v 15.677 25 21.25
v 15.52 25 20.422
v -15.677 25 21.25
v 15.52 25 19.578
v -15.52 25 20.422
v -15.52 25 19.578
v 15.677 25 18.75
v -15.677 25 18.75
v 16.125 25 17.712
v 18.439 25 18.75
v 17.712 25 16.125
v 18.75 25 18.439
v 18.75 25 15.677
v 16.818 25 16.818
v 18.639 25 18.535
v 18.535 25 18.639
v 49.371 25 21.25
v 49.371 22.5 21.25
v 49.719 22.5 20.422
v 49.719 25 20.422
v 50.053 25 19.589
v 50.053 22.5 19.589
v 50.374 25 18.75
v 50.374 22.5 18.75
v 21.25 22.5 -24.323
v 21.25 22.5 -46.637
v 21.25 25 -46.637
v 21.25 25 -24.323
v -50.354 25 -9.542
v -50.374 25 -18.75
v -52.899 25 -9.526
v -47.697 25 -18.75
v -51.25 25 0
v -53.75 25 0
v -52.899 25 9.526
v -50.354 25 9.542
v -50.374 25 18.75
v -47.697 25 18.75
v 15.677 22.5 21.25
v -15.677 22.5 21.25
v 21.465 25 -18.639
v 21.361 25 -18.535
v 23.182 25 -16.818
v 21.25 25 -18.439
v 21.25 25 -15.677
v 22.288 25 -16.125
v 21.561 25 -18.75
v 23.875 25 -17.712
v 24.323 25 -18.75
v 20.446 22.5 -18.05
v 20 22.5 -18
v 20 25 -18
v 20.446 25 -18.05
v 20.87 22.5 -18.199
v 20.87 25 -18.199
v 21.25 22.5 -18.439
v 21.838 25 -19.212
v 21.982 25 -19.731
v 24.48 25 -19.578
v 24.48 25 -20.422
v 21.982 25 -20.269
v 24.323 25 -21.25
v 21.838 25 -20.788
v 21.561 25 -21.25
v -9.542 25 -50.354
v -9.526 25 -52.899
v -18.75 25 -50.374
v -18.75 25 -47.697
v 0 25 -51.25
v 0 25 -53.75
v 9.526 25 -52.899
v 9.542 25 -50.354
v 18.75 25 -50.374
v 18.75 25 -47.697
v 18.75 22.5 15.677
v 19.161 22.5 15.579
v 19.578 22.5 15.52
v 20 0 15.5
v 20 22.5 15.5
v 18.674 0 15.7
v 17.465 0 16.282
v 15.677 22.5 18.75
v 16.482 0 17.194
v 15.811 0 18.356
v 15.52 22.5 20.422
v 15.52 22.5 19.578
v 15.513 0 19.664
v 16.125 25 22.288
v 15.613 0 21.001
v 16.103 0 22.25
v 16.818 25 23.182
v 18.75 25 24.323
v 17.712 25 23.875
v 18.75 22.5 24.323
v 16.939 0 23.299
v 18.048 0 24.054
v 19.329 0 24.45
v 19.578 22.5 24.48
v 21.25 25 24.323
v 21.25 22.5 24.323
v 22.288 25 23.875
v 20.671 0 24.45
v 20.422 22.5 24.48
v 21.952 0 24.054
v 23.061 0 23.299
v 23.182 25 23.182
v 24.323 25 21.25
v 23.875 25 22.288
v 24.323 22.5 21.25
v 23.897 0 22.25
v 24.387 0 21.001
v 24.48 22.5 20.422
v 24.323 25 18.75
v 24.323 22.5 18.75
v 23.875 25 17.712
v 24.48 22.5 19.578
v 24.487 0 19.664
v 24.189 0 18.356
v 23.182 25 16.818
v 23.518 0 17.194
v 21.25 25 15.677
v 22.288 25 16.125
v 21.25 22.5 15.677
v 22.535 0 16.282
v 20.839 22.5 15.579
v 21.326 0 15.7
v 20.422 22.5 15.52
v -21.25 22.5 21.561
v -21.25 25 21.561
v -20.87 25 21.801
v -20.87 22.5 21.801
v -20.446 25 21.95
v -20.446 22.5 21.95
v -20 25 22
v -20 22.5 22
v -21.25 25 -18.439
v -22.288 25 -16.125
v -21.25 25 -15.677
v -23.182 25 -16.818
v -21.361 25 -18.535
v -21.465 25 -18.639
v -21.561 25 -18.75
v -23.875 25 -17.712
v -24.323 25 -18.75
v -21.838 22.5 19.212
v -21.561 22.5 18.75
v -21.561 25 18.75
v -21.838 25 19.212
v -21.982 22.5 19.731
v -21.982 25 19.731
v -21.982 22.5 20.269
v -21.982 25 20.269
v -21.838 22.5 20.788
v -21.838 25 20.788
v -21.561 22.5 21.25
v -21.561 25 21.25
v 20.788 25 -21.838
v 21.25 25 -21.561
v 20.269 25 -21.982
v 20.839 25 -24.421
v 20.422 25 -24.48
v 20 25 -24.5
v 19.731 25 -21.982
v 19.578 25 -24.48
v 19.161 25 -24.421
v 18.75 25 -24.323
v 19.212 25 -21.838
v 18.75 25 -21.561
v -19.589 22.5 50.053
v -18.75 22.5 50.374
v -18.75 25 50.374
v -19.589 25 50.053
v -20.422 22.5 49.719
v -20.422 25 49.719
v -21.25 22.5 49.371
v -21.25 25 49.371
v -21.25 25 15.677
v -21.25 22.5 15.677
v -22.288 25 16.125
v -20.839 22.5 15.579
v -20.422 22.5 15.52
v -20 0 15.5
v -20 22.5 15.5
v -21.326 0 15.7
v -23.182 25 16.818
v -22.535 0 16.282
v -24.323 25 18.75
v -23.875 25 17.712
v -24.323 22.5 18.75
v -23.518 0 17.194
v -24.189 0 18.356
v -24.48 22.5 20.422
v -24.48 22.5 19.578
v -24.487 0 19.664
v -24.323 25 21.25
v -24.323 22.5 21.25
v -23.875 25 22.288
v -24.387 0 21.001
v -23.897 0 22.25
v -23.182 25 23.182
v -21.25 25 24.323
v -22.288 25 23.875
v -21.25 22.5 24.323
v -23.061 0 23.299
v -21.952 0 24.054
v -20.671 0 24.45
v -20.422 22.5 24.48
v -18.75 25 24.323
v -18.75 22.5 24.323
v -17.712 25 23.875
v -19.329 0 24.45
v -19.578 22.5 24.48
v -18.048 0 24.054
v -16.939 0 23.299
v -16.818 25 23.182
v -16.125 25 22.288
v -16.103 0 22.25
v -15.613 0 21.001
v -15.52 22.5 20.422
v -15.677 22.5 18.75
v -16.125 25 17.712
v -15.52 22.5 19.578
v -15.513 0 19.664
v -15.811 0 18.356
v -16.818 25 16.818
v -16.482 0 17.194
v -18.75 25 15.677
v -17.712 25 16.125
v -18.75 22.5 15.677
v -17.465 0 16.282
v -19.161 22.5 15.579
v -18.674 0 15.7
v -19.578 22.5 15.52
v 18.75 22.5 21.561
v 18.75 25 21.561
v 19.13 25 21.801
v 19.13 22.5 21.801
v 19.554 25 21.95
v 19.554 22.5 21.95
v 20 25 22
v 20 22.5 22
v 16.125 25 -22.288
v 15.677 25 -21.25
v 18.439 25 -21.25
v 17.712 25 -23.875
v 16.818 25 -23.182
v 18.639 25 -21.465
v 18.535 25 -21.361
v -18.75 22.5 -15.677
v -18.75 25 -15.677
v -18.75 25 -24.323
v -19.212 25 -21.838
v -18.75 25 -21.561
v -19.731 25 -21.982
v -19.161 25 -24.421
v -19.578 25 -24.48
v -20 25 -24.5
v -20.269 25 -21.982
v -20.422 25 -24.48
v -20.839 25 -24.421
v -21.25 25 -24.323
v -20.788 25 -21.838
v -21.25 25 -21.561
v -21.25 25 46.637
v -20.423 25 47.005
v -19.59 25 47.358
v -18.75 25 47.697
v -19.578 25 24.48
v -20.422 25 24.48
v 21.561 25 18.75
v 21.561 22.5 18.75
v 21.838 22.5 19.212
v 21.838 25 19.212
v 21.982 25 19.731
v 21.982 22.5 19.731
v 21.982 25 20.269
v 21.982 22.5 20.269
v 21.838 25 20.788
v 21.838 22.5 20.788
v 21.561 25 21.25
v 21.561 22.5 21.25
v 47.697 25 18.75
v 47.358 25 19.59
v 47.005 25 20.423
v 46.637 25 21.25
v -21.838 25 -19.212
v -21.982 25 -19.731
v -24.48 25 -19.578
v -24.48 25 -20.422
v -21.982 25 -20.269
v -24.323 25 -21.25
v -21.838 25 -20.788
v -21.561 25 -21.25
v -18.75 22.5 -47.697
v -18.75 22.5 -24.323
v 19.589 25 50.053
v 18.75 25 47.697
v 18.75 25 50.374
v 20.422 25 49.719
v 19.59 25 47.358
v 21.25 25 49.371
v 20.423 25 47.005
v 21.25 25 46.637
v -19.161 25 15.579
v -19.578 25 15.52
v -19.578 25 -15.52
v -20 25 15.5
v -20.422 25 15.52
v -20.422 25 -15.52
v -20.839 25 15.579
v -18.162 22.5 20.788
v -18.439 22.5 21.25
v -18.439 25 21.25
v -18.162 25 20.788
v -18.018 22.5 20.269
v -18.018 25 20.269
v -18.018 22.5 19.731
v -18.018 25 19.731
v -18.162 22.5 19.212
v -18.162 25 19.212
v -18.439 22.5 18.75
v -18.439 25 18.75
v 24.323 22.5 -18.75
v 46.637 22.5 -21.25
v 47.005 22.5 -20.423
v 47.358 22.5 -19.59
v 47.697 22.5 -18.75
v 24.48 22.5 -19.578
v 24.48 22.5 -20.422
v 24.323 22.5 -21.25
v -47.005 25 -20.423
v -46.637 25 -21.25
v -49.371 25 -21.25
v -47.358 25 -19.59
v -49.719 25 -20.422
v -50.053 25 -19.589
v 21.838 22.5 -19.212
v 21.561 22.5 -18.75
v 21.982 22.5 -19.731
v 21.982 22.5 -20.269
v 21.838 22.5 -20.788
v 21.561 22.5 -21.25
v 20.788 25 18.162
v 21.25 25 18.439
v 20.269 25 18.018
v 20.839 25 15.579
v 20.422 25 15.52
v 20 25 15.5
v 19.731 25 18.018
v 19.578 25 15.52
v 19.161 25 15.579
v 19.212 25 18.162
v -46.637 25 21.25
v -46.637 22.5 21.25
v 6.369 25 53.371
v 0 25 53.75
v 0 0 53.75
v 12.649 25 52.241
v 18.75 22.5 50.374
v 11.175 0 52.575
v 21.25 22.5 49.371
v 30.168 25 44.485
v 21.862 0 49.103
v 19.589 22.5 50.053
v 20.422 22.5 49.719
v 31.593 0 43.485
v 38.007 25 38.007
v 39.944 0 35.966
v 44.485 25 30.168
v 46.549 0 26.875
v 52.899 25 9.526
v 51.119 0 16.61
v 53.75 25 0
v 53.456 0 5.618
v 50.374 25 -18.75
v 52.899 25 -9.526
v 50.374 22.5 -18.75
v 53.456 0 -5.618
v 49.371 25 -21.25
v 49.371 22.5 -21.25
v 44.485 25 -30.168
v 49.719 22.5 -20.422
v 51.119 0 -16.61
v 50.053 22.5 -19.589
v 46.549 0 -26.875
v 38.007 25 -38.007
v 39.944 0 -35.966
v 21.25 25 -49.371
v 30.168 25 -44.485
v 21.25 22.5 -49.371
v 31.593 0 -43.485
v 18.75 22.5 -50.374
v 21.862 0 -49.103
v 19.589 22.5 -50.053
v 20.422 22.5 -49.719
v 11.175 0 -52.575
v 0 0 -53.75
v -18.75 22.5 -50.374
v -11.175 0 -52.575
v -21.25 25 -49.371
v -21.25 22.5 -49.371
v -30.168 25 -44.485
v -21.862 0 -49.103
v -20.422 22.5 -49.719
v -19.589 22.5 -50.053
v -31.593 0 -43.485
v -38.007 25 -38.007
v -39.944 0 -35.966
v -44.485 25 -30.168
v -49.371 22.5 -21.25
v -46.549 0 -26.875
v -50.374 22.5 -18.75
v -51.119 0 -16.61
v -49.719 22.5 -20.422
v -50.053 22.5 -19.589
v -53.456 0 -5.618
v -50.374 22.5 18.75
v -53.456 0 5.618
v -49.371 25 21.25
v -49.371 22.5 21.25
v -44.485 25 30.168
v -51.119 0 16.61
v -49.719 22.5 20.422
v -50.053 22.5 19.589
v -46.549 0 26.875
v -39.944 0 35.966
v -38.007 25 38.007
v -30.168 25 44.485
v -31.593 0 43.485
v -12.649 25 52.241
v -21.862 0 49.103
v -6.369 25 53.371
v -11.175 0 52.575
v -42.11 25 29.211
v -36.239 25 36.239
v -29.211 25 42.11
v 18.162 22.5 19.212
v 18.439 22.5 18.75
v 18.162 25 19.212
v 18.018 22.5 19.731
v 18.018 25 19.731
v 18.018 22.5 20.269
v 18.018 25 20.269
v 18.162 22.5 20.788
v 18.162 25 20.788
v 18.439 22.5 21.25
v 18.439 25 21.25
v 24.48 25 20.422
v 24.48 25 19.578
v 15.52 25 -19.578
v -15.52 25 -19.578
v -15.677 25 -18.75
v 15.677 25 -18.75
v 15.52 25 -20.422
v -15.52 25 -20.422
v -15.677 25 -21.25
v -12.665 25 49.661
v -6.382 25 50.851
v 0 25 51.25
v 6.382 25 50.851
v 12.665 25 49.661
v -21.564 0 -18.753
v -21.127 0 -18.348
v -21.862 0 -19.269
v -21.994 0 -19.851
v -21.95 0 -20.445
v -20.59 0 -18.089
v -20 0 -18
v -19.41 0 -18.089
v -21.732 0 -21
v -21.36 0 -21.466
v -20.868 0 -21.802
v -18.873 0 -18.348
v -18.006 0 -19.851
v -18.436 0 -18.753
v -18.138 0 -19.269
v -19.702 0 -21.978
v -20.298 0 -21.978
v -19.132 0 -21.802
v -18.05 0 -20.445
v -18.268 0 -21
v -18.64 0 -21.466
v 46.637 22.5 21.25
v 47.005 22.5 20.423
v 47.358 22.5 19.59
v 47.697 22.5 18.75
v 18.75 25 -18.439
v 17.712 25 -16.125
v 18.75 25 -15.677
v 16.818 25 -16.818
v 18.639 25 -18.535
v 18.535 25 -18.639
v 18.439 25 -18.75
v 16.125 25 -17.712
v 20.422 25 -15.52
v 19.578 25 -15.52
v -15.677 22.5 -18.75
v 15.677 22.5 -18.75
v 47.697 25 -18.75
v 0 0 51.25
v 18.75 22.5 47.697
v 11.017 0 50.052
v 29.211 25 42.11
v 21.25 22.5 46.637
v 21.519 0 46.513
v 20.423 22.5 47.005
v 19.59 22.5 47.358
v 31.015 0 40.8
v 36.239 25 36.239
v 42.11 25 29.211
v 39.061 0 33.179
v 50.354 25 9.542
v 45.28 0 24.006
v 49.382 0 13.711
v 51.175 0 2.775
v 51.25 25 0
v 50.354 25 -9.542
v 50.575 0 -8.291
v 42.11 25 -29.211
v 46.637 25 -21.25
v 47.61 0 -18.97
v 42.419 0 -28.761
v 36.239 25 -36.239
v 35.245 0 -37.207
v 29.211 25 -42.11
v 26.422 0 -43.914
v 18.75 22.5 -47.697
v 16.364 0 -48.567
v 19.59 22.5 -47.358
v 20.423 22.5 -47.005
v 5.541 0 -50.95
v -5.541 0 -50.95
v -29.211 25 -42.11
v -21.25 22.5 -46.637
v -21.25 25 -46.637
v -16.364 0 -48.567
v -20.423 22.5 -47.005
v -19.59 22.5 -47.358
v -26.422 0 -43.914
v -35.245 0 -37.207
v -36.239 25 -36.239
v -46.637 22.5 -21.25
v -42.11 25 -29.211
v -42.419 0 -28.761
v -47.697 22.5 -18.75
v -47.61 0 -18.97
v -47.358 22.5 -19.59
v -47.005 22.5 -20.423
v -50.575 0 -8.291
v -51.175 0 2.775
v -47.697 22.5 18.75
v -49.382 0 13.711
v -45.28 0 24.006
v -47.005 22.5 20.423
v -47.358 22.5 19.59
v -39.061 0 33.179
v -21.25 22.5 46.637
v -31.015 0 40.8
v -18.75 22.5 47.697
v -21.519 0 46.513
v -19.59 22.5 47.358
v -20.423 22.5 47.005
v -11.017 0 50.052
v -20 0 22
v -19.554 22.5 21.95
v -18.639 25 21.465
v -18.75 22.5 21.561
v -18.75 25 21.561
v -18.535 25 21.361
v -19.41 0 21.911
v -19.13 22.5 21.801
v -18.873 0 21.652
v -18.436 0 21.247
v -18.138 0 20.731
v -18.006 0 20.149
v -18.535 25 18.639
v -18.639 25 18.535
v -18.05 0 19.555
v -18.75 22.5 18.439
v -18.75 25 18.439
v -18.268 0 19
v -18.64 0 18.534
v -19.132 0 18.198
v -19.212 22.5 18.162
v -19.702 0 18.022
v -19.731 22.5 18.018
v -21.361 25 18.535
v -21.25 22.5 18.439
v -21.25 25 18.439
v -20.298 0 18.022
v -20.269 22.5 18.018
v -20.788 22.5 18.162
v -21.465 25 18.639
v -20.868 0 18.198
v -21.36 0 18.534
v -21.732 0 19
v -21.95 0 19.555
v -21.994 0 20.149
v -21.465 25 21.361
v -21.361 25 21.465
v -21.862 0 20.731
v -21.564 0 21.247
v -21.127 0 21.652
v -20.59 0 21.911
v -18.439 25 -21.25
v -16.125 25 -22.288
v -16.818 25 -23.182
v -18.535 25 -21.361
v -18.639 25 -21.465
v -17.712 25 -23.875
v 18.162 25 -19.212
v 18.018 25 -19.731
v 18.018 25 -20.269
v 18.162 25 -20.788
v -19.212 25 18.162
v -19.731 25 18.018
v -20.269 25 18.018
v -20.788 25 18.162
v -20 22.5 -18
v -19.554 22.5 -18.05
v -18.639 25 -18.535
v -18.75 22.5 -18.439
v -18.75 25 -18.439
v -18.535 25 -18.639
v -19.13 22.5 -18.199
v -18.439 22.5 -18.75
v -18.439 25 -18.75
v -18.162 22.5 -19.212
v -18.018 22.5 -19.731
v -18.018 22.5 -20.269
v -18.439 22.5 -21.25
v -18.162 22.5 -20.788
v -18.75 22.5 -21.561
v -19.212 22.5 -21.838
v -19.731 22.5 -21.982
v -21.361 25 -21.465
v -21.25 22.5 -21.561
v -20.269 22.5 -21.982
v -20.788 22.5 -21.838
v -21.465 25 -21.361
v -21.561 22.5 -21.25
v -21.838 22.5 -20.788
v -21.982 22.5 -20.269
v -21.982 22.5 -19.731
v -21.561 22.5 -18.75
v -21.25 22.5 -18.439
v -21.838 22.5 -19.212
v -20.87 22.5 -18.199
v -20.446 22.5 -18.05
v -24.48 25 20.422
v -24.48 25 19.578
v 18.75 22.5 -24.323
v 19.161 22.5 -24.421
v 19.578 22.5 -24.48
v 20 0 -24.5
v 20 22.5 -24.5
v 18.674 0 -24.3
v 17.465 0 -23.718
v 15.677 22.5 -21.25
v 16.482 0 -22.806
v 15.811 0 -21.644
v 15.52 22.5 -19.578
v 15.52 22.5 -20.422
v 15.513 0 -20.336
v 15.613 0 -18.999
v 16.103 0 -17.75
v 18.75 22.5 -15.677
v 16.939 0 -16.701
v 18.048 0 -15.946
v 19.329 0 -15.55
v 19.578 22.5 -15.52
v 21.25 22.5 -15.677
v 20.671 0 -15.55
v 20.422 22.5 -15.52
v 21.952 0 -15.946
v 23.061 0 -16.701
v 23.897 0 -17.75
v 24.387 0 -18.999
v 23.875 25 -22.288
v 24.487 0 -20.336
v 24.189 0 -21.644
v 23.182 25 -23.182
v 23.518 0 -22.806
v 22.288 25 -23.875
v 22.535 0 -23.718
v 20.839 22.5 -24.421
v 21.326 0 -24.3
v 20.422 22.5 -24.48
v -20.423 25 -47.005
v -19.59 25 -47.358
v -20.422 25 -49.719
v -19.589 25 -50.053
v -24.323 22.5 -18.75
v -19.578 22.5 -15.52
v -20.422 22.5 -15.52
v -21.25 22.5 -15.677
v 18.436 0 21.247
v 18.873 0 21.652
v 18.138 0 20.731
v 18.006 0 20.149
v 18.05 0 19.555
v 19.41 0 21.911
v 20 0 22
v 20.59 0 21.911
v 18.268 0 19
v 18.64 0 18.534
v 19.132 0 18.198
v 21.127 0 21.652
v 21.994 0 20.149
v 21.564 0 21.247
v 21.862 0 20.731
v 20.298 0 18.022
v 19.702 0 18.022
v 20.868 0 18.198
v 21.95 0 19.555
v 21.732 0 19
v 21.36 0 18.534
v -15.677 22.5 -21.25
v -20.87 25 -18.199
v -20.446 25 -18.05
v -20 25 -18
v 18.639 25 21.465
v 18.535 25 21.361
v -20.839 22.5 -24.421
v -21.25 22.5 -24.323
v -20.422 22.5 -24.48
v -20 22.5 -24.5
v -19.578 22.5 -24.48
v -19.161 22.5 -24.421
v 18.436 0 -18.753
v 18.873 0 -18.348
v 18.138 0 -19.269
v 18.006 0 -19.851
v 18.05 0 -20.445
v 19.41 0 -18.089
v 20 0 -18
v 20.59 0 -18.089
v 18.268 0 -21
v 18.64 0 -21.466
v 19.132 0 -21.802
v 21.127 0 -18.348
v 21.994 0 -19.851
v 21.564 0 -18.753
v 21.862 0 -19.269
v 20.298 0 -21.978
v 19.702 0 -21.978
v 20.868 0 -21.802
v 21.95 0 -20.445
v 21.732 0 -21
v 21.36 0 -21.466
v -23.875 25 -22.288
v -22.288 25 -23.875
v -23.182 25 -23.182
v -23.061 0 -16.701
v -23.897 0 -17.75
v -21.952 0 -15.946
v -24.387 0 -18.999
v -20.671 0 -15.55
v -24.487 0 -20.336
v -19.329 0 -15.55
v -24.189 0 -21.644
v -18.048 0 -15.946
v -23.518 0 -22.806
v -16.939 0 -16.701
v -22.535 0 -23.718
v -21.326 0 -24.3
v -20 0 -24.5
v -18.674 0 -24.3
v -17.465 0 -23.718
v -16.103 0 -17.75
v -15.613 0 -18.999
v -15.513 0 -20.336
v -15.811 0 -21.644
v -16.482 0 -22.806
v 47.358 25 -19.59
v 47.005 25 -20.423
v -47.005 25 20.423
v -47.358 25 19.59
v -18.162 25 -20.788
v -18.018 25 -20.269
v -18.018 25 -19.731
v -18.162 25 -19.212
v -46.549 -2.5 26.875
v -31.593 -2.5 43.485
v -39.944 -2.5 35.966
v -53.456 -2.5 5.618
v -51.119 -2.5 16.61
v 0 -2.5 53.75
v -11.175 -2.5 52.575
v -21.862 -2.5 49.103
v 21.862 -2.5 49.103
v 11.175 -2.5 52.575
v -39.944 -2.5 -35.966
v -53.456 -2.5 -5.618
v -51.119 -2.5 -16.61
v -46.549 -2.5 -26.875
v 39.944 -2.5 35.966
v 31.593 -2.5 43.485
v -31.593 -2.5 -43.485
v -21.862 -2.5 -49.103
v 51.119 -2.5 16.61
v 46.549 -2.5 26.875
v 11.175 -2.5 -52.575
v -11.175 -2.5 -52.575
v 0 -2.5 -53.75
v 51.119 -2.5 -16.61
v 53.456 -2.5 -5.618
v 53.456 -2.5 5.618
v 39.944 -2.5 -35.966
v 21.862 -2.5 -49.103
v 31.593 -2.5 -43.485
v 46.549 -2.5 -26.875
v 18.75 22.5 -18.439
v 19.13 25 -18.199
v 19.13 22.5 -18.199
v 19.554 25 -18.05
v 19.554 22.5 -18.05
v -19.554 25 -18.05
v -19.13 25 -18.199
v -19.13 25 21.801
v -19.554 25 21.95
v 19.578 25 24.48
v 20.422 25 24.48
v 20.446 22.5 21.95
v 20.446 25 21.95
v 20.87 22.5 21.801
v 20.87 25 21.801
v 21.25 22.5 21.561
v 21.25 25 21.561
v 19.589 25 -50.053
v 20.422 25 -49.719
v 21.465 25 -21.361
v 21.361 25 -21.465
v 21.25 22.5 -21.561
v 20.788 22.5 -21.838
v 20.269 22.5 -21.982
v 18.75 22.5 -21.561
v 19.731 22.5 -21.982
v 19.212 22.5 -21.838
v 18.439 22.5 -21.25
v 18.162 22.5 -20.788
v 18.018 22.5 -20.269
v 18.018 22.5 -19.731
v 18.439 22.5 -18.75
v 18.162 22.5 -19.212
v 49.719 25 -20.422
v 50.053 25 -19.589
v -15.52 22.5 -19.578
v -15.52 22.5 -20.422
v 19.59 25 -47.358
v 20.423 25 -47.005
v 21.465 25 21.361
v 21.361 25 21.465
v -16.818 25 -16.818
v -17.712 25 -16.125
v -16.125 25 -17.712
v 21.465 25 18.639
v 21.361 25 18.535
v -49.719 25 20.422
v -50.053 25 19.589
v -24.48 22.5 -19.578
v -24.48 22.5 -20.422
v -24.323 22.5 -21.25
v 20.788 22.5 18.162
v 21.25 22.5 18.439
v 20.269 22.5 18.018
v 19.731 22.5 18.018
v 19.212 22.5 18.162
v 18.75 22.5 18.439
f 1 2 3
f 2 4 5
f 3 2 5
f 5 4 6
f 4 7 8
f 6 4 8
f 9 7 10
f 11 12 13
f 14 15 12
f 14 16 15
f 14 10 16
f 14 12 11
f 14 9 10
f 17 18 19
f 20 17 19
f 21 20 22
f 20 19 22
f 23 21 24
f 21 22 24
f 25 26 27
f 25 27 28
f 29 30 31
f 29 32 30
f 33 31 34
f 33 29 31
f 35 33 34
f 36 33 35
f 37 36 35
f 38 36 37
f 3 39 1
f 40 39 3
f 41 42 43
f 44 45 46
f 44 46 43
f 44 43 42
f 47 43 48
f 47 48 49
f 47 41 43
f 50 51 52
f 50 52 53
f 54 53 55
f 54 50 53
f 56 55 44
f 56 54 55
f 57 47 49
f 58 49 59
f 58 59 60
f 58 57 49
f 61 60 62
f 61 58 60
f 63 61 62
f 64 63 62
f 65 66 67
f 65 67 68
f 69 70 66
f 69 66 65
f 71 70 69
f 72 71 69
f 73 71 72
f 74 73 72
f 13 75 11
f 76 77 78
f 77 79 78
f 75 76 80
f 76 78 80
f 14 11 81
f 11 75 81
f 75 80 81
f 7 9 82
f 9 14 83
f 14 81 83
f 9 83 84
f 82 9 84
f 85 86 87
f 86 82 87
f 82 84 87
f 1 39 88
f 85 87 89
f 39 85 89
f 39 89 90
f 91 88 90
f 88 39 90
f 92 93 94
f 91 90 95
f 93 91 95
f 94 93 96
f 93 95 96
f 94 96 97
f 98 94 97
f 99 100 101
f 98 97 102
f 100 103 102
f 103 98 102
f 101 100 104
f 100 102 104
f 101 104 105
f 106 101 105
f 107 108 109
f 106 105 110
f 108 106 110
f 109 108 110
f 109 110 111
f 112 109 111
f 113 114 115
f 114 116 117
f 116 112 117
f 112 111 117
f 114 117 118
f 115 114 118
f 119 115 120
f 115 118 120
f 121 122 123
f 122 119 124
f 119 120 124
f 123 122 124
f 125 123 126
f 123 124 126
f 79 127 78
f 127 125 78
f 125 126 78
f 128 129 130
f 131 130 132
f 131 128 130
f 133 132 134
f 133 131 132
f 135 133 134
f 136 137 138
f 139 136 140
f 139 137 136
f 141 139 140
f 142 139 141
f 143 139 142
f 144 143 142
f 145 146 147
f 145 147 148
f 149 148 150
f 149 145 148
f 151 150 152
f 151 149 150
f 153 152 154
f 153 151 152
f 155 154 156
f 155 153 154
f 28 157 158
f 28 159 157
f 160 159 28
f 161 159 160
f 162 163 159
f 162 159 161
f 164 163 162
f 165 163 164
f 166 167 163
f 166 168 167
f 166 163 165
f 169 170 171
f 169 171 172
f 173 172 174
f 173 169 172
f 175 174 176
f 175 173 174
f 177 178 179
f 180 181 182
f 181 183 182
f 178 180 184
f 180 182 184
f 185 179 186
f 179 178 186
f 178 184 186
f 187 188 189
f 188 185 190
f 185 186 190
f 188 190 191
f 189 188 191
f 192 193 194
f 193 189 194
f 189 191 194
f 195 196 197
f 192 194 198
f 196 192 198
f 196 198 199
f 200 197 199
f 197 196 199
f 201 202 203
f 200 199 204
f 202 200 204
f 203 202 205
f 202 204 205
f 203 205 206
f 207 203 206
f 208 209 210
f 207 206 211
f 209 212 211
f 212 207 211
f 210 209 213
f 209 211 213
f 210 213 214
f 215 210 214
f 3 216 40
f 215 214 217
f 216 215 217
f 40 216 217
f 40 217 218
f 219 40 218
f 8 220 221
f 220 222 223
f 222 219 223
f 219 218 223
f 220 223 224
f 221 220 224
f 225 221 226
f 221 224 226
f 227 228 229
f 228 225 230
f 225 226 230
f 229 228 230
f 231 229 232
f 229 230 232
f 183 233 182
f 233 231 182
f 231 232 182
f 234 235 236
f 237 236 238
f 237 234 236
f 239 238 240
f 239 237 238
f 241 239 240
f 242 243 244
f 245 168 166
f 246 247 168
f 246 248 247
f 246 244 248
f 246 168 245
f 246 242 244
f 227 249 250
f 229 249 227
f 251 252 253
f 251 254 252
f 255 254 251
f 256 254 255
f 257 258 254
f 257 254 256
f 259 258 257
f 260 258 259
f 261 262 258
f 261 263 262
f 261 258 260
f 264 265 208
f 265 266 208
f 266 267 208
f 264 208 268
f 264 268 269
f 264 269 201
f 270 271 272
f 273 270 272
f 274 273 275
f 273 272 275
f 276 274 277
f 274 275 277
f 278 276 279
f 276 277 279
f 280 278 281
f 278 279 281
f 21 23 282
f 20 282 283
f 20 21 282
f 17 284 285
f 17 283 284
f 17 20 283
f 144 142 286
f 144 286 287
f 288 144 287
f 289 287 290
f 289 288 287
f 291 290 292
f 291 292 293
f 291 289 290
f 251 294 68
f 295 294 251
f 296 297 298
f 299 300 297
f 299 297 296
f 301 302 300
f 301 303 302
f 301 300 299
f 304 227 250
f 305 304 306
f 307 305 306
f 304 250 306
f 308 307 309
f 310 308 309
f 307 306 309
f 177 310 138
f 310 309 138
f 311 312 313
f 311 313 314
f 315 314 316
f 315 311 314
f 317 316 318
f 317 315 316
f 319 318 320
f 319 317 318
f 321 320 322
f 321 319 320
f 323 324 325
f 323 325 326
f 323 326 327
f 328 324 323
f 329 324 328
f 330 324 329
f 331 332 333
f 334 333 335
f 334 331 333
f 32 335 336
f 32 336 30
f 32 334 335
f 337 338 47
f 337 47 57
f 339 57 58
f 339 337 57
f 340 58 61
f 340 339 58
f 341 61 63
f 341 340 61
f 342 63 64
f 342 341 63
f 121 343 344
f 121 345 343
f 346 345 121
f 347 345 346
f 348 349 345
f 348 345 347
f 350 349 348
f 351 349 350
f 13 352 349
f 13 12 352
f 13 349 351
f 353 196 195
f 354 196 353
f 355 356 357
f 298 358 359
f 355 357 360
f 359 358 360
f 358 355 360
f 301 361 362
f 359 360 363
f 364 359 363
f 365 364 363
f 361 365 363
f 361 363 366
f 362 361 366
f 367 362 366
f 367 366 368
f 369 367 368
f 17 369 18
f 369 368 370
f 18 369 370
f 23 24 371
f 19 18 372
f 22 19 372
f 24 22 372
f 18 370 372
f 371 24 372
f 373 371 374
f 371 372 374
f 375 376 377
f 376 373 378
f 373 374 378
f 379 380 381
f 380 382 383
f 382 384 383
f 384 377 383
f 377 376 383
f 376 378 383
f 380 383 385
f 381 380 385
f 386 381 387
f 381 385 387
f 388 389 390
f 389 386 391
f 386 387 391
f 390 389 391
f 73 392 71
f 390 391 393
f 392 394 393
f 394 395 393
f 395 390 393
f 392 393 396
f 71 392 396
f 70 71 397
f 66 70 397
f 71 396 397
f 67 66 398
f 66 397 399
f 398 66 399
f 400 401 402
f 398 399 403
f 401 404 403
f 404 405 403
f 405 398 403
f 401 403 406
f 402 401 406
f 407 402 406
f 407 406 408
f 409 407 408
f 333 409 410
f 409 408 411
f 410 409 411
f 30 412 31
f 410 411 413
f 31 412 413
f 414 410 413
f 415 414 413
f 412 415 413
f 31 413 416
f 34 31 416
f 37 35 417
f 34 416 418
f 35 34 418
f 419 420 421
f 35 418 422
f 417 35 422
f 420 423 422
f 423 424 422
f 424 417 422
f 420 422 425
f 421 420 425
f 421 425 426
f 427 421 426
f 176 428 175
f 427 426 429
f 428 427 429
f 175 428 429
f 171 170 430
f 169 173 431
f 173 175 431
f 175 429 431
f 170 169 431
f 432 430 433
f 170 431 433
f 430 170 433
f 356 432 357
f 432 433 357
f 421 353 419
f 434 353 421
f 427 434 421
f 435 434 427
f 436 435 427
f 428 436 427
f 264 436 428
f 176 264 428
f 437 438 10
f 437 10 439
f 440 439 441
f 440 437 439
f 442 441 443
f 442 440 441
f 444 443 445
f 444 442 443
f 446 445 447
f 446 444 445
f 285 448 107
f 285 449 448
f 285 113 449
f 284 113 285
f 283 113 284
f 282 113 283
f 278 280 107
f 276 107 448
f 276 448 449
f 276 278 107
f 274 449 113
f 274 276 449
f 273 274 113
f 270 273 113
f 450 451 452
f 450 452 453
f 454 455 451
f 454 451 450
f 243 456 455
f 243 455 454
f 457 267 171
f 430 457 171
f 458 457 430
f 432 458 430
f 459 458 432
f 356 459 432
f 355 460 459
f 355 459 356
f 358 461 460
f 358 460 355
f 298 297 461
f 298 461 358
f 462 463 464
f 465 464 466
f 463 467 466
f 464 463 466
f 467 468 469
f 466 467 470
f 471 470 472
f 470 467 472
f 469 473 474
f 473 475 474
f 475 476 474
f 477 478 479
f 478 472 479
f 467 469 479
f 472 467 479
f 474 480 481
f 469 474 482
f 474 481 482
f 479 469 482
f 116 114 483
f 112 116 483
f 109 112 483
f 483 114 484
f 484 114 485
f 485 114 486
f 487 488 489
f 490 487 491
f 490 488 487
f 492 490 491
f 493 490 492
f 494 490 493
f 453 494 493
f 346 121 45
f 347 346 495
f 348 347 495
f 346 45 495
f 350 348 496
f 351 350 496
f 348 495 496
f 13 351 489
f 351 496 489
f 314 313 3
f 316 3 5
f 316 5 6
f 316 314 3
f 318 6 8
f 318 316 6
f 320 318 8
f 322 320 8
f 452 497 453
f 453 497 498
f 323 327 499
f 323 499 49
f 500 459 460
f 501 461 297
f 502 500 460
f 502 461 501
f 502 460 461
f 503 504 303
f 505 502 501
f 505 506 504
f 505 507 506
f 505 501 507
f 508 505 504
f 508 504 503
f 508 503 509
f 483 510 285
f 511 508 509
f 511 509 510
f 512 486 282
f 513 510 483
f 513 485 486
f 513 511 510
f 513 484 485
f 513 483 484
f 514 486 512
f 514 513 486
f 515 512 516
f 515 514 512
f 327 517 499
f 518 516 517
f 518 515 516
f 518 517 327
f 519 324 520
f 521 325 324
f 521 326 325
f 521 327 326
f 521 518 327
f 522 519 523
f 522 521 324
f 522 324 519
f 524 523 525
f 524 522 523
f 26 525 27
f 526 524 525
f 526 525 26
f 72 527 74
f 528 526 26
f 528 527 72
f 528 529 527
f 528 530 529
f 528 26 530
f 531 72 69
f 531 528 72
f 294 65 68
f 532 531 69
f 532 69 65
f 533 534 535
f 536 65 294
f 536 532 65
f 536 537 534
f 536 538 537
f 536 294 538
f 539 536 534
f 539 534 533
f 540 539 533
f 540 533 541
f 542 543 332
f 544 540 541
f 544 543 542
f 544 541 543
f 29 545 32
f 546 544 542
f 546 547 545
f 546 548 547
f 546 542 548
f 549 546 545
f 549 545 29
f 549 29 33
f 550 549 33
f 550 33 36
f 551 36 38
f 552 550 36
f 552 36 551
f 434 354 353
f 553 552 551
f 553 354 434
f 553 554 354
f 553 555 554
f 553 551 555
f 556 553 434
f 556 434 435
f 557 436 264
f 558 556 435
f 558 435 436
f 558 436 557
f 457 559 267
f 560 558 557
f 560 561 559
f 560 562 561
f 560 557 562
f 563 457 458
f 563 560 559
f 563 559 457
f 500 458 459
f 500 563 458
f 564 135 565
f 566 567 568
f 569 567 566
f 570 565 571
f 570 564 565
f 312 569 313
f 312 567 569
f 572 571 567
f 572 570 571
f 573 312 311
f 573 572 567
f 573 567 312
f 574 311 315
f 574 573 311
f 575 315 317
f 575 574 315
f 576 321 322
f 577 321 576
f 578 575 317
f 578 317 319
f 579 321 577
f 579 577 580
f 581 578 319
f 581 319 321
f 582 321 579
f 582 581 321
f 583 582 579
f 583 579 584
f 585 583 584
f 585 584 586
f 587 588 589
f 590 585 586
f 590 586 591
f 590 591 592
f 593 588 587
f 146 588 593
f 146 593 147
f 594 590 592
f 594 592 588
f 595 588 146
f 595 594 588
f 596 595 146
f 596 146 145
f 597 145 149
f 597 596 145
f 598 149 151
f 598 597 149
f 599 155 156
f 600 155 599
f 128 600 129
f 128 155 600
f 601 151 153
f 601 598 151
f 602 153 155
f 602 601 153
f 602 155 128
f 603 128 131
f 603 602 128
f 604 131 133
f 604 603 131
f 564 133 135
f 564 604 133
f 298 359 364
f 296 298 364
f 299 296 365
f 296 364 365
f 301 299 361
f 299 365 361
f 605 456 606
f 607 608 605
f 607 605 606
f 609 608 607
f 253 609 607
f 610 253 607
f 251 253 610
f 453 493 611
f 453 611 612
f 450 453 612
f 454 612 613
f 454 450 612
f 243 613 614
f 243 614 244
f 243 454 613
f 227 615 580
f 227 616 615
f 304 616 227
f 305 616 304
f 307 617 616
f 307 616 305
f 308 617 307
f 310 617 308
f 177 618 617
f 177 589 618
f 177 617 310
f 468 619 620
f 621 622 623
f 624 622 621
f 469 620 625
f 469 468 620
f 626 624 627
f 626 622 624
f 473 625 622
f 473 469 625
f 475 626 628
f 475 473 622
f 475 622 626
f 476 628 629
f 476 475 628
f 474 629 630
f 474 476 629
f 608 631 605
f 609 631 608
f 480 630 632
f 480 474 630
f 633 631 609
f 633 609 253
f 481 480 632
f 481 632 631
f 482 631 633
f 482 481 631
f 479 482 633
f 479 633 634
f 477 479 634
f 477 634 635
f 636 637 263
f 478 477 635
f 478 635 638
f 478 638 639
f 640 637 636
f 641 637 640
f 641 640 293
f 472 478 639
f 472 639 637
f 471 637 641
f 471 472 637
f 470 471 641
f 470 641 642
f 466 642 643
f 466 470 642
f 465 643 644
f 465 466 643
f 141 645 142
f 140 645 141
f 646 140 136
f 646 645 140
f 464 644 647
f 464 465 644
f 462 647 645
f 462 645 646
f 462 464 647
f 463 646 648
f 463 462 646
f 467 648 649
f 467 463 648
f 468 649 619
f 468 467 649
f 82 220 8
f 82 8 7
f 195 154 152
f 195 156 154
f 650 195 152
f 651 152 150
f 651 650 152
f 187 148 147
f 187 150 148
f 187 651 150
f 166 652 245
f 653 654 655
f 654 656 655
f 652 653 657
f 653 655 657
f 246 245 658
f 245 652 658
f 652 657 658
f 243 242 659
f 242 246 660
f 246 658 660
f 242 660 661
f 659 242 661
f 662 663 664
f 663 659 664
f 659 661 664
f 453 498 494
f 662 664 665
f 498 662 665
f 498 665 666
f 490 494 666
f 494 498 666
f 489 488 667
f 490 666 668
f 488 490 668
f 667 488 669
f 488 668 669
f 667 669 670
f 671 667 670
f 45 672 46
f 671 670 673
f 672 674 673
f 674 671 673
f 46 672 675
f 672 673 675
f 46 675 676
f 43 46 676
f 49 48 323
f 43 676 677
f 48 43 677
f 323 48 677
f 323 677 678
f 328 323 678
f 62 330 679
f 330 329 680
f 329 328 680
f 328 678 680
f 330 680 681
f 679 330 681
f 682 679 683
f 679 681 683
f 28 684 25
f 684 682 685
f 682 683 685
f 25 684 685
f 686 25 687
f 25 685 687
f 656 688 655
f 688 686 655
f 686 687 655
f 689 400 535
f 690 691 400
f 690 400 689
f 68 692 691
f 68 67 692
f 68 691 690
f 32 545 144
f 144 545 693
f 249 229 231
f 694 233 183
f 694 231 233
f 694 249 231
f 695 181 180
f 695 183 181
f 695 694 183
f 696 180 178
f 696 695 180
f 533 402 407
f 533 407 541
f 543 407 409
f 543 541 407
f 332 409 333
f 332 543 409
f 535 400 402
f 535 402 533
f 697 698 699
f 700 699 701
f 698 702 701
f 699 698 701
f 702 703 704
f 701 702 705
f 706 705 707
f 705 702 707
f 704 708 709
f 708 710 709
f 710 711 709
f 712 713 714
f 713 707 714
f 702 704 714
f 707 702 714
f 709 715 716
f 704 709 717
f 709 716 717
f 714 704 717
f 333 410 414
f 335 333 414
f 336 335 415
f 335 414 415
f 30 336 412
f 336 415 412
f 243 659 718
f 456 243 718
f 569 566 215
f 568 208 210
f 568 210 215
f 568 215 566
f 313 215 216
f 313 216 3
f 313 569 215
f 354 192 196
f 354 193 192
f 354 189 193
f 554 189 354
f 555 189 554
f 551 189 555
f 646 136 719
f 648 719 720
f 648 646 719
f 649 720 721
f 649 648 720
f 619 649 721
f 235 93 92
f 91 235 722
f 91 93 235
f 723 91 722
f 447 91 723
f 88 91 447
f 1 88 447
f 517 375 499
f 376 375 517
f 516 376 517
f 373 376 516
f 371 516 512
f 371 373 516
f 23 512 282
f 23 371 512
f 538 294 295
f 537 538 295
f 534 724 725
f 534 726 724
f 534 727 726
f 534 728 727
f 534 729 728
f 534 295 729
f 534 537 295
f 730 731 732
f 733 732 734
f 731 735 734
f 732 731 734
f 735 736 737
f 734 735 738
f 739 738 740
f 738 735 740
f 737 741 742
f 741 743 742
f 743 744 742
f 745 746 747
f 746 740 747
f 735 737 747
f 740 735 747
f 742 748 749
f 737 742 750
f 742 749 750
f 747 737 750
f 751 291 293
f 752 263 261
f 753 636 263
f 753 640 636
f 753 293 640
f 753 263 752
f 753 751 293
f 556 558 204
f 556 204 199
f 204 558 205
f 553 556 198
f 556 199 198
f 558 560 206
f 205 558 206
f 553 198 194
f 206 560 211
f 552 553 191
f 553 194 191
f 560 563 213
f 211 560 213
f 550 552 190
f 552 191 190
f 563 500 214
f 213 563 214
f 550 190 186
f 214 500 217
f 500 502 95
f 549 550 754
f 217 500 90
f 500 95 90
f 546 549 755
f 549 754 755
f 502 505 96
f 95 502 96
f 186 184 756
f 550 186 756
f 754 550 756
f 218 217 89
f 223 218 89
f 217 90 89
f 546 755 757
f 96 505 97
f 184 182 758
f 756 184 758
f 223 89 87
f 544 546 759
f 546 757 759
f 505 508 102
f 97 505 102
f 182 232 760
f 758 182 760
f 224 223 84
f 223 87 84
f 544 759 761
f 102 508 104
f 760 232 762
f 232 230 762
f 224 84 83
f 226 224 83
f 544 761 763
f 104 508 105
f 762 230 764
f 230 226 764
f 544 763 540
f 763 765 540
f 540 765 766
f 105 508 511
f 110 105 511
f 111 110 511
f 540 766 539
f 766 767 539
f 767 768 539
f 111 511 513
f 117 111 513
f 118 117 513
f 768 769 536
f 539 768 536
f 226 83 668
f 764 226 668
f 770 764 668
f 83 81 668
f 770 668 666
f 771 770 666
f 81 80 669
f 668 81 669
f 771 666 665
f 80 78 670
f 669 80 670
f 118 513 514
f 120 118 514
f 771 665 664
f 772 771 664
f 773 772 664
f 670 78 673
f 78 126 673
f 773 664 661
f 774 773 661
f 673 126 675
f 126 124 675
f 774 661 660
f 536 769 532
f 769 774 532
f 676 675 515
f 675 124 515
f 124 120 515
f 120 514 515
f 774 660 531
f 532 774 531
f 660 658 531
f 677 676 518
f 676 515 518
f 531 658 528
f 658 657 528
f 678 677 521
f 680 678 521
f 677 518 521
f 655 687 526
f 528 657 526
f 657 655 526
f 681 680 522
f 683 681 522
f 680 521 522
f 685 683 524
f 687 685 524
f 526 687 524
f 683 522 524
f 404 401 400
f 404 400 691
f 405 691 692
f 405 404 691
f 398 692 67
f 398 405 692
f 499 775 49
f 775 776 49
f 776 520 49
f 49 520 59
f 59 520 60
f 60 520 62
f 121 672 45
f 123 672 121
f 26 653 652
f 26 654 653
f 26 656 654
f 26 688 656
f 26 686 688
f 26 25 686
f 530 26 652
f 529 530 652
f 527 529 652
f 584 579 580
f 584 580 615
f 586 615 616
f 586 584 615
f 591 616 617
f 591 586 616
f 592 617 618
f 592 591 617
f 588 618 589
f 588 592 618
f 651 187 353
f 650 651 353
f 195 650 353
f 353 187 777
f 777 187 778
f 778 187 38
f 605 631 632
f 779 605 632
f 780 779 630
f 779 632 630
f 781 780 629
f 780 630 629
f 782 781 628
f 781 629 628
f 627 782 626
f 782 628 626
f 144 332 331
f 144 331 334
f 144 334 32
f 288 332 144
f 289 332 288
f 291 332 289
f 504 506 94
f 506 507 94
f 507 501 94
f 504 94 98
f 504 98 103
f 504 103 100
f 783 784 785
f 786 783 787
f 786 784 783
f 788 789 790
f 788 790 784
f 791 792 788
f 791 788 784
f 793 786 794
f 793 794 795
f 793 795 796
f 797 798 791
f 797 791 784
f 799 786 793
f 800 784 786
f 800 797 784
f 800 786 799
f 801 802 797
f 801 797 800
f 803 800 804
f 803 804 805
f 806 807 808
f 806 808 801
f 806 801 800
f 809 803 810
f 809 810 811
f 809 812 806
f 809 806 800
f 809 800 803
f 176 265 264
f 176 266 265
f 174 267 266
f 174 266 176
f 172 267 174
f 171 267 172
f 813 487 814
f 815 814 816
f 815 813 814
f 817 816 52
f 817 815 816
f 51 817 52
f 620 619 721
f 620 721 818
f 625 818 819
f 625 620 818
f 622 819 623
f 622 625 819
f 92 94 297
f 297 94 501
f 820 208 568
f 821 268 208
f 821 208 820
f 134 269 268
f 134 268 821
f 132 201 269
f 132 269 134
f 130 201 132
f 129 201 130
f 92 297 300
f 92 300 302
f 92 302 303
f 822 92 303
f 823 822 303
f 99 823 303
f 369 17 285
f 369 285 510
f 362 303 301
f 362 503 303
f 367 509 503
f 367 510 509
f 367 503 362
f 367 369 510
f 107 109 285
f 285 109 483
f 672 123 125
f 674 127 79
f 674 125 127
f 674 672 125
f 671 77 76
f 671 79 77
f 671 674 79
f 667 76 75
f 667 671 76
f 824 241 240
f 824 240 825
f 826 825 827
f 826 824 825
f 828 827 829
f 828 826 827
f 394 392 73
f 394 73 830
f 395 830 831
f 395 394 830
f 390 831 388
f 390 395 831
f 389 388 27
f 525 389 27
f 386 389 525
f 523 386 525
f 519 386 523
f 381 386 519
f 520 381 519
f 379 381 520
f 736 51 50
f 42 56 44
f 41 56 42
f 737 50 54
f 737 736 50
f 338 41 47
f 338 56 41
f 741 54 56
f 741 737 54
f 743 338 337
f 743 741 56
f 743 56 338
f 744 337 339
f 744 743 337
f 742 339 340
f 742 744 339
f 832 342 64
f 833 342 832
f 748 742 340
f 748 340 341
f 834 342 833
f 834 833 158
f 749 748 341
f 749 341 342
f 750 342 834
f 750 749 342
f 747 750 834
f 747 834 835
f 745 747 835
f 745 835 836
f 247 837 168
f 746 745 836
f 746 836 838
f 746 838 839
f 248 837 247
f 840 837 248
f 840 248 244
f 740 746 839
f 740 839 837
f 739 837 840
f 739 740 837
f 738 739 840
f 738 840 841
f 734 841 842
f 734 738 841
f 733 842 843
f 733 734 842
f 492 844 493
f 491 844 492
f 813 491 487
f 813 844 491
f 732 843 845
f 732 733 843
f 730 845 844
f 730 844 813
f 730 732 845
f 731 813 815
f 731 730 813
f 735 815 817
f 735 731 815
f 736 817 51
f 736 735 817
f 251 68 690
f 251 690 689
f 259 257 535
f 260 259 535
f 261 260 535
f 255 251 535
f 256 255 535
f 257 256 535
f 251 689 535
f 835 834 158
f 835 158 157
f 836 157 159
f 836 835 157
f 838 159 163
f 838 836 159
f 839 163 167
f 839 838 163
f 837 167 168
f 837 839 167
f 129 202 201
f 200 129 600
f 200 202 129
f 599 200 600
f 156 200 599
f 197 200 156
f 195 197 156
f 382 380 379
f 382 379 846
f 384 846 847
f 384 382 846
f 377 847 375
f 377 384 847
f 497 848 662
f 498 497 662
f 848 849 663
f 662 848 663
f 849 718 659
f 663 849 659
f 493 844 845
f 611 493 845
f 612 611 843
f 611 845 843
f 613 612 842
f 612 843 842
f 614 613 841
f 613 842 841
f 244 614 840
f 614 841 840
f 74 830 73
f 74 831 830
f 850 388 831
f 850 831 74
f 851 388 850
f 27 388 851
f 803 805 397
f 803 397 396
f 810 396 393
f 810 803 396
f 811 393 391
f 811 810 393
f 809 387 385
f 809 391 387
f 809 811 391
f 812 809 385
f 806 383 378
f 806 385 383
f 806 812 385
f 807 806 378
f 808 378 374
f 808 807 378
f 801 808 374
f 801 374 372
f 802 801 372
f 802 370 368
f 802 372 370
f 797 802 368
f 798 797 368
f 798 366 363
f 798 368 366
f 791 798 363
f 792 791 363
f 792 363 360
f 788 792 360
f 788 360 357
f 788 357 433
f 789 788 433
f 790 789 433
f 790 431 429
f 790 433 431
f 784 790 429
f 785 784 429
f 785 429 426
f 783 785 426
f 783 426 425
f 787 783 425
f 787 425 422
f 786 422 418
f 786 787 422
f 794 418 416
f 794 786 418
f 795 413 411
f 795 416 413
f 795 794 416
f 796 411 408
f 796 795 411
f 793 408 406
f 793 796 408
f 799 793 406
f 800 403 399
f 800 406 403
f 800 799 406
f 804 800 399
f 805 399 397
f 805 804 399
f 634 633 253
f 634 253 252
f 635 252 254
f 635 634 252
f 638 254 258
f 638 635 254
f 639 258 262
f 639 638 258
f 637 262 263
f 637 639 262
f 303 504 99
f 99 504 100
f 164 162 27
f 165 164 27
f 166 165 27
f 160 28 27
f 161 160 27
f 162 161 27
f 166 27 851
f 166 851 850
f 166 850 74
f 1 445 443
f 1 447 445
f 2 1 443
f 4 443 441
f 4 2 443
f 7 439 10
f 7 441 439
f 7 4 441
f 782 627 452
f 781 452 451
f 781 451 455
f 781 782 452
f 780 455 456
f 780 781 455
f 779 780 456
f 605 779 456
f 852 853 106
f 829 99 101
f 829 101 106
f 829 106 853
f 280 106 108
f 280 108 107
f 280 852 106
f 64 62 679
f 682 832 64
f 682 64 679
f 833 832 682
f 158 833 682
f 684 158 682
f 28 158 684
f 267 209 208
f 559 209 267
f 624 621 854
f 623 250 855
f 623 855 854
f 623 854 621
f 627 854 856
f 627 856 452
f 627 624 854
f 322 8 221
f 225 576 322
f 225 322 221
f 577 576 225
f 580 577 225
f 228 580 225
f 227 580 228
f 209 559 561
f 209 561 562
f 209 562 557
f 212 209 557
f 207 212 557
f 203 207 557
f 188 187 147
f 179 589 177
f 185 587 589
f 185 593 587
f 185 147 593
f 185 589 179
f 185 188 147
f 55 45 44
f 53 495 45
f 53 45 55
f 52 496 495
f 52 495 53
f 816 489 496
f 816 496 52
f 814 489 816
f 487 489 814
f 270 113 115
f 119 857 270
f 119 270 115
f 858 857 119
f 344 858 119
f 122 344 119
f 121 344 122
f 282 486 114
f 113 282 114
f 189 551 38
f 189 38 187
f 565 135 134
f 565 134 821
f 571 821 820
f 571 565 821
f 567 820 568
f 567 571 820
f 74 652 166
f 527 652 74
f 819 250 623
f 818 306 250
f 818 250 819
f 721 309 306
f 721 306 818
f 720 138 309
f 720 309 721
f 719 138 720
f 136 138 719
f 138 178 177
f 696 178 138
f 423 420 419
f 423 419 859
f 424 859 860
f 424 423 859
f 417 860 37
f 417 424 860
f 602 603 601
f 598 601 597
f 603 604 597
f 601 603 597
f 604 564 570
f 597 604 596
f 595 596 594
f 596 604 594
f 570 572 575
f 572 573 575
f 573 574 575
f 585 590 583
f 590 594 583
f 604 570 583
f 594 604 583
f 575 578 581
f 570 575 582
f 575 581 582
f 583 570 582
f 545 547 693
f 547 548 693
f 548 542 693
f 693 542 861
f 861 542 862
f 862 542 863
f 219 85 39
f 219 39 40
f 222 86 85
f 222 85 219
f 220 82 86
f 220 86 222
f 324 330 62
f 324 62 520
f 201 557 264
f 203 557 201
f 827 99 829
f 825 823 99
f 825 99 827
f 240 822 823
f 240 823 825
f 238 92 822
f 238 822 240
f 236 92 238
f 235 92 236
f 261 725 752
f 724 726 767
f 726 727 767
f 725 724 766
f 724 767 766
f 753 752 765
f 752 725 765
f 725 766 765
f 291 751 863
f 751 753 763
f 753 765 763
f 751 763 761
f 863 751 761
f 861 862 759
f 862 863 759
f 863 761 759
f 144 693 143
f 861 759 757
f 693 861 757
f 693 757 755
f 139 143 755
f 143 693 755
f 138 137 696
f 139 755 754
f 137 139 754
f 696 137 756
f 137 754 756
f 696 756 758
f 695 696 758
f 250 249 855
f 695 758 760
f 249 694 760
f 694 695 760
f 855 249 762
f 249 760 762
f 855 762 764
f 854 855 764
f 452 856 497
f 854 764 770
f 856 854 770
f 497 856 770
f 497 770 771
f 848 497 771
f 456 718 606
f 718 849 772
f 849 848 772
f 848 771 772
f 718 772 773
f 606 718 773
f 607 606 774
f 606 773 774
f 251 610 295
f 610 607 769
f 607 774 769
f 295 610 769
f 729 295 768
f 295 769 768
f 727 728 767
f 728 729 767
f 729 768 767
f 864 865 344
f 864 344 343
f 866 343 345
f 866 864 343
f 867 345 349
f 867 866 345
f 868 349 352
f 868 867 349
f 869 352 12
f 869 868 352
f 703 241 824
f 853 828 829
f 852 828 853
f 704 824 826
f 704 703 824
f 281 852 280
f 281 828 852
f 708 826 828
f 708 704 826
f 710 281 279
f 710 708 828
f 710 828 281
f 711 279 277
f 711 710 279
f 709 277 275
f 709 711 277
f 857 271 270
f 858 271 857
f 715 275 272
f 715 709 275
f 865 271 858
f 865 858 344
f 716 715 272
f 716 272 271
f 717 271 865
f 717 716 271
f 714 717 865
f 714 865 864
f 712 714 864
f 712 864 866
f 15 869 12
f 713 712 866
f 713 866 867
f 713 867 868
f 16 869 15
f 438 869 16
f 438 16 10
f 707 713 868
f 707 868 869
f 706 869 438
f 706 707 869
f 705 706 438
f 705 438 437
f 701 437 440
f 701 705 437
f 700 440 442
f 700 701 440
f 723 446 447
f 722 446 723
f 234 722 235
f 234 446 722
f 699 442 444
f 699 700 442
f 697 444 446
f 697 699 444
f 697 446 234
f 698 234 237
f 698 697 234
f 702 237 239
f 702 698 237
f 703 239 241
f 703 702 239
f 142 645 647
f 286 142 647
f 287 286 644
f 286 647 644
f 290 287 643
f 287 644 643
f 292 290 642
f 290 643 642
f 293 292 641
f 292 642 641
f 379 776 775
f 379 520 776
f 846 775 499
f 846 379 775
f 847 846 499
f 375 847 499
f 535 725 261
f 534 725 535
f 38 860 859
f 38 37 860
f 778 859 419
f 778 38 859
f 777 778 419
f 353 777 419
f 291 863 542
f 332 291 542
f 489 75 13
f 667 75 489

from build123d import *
from build123d.topology import SkipClean

# Parameters (mm, degrees)
SKETCH1_R           = 53.75
SKETCH1_R_2         = 51.25
BOSS_EXTRUDE1_DEPTH = 25
BOSS_EXTRUDE2_START = 2.5
SKETCH6_R           = 53.75
BOSS_EXTRUDE2_DEPTH = 2.5
SKETCH8_R           = 4.5
SKETCH8_R_2         = 2
BOSS_EXTRUDE3_DEPTH = 25
BOSS_EXTRUDE4_START = -2.5
BOSS_EXTRUDE4_DEPTH = 2.5


with BuildPart() as part:
    # Sketch1 → Boss-Extrude1 (new body)
    with BuildSketch(Plane(origin=(0, 0, 0), x_dir=(1, 0, 0), z_dir=(0, 1, 0))):
        with Locations(Location((0, 0, 0), (0, 0, 270))):
            Circle(SKETCH1_R)
        with Locations(Location((0, 0, 0), (0, 0, 270))):
            Circle(SKETCH1_R_2, mode=Mode.SUBTRACT)
    extrude(amount=BOSS_EXTRUDE1_DEPTH)

    # Sketch6 → Boss-Extrude2 (add)
    with BuildSketch(Plane.XZ.offset(BOSS_EXTRUDE2_START)):
        with Locations(Location((0, 0, 0), (0, 0, 270))):
            Circle(SKETCH6_R)
    extrude(amount=-BOSS_EXTRUDE2_DEPTH)

    # Sketch8 → Boss-Extrude3 (add)
    # profile 1 of 4: a face of its own
    with BuildSketch(Plane(origin=(0, 0, 0), x_dir=(1, 0, 0), z_dir=(0, 1, 0))):
        with Locations(Location((-20, 20, 0), (0, 0, 90))):
            Circle(SKETCH8_R)
        with Locations(Location((-20, 20, 0), (0, 0, 270))):
            Circle(SKETCH8_R_2, mode=Mode.SUBTRACT)
    # profile 2 of 4: a face of its own
    with BuildSketch(Plane(origin=(0, 0, 0), x_dir=(1, 0, 0), z_dir=(0, 1, 0))):
        with Locations(Location((20, 20, 0), (0, 0, 90))):
            Circle(SKETCH8_R)
        with Locations(Location((20, 20, 0), (0, 0, 270))):
            Circle(SKETCH8_R_2, mode=Mode.SUBTRACT)
    # profile 3 of 4: a face of its own
    with BuildSketch(Plane(origin=(0, 0, 0), x_dir=(1, 0, 0), z_dir=(0, 1, 0))):
        with Locations(Location((20, -20, 0), (0, 0, 90))):
            Circle(SKETCH8_R)
        with Locations(Location((20, -20, 0), (0, 0, 270))):
            Circle(SKETCH8_R_2, mode=Mode.SUBTRACT)
    # profile 4 of 4: a face of its own
    with BuildSketch(Plane(origin=(0, 0, 0), x_dir=(1, 0, 0), z_dir=(0, 1, 0))):
        with Locations(Location((-20, -20, 0), (0, 0, 90))):
            Circle(SKETCH8_R)
        with Locations(Location((-20, -20, 0), (0, 0, 270))):
            Circle(SKETCH8_R_2, mode=Mode.SUBTRACT)
    extrude(amount=BOSS_EXTRUDE3_DEPTH)

    # Sketch12 → Boss-Extrude4 (add)
    with SkipClean():  # the faces are left unmerged after this step: merging them gives an invalid solid
        with BuildSketch(Plane(origin=(0, 25, 0), x_dir=(1, 0, 0), z_dir=(0, 1, 0)).offset(BOSS_EXTRUDE4_START)):
            with BuildLine():
                Line((-18.75, 18.4387505), (-18.75, -18.4387505))
                ThreePointArc((-18.75, -18.4387505), (-20, -18), (-21.25, -18.4387505))
                Line((-21.25, -18.4387505), (-21.25, 18.4387505))
                ThreePointArc((-21.25, 18.4387505), (-20, 18), (-18.75, 18.4387505))
            make_face()
            with BuildLine():
                Line((18.4387505, 21.25), (-18.4387505, 21.25))
                ThreePointArc((-18.4387505, 21.25), (-18, 20), (-18.4387505, 18.75))
                Line((-18.4387505, 18.75), (18.4387505, 18.75))
                ThreePointArc((18.4387505, 18.75), (18, 20), (18.4387505, 21.25))
            make_face()
            with BuildLine():
                Line((21.25, 18.4387505), (21.25, -18.4387505))
                ThreePointArc((21.25, -18.4387505), (20, -18), (18.75, -18.4387505))
                Line((18.75, -18.4387505), (18.75, 18.4387505))
                ThreePointArc((18.75, 18.4387505), (20, 18), (21.25, 18.4387505))
            make_face()
            with BuildLine():
                Line((18.4387505, -21.25), (-18.4387505, -21.25))
                ThreePointArc((-18.4387505, -21.25), (-18, -20), (-18.4387505, -18.75))
                Line((-18.4387505, -18.75), (18.4387505, -18.75))
                ThreePointArc((18.4387505, -18.75), (18, -20), (18.4387505, -21.25))
            make_face()
            with BuildLine():
                Line((-21.5612495, 21.25), (-49.371044145, 21.25))
                ThreePointArc((-49.371044145, 21.25), (-49.887986714, 20.006281055), (-50.373604199, 18.75))
                Line((-50.373604199, 18.75), (-21.5612495, 18.75))
                ThreePointArc((-21.5612495, 18.75), (-22, 20), (-21.5612495, 21.25))
            make_face()
            with BuildLine():
                Line((-21.25, 21.5612495), (-21.25, 49.371044145))
                ThreePointArc((-21.25, 49.371044145), (-20.006281055, 49.887986714), (-18.75, 50.373604199))
                Line((-18.75, 50.373604199), (-18.75, 21.5612495))
                ThreePointArc((-18.75, 21.5612495), (-20, 22), (-21.25, 21.5612495))
            make_face()
            with BuildLine():
                Line((18.75, 21.5612495), (18.75, 50.373604199))
                ThreePointArc((18.75, 50.373604199), (20.006281055, 49.887986714), (21.25, 49.371044145))
                Line((21.25, 49.371044145), (21.25, 21.5612495))
                ThreePointArc((21.25, 21.5612495), (20, 22), (18.75, 21.5612495))
            make_face()
            with BuildLine():
                Line((21.5612495, 21.25), (49.371044145, 21.25))
                ThreePointArc((49.371044145, 21.25), (49.887986714, 20.006281055), (50.373604199, 18.75))
                Line((50.373604199, 18.75), (21.5612495, 18.75))
                ThreePointArc((21.5612495, 18.75), (22, 20), (21.5612495, 21.25))
            make_face()
            with BuildLine():
                Line((18.75, -21.5612495), (18.75, -50.373604199))
                ThreePointArc((18.75, -50.373604199), (20.006281055, -49.887986714), (21.25, -49.371044145))
                Line((21.25, -49.371044145), (21.25, -21.5612495))
                ThreePointArc((21.25, -21.5612495), (20, -22), (18.75, -21.5612495))
            make_face()
            with BuildLine():
                Line((21.5612495, -21.25), (49.371044145, -21.25))
                ThreePointArc((49.371044145, -21.25), (49.887986714, -20.006281055), (50.373604199, -18.75))
                Line((50.373604199, -18.75), (21.5612495, -18.75))
                ThreePointArc((21.5612495, -18.75), (22, -20), (21.5612495, -21.25))
            make_face()
            with BuildLine():
                Line((-18.75, -21.5612495), (-18.75, -50.373604199))
                ThreePointArc((-18.75, -50.373604199), (-20.006281055, -49.887986714), (-21.25, -49.371044145))
                Line((-21.25, -49.371044145), (-21.25, -21.5612495))
                ThreePointArc((-21.25, -21.5612495), (-20, -22), (-18.75, -21.5612495))
            make_face()
            with BuildLine():
                Line((-21.5612495, -21.25), (-49.371044145, -21.25))
                ThreePointArc((-49.371044145, -21.25), (-49.887986714, -20.006281055), (-50.373604199, -18.75))
                Line((-50.373604199, -18.75), (-21.5612495, -18.75))
                ThreePointArc((-21.5612495, -18.75), (-22, -20), (-21.5612495, -21.25))
            make_face()
        extrude(amount=BOSS_EXTRUDE4_DEPTH)


solid = part.part
